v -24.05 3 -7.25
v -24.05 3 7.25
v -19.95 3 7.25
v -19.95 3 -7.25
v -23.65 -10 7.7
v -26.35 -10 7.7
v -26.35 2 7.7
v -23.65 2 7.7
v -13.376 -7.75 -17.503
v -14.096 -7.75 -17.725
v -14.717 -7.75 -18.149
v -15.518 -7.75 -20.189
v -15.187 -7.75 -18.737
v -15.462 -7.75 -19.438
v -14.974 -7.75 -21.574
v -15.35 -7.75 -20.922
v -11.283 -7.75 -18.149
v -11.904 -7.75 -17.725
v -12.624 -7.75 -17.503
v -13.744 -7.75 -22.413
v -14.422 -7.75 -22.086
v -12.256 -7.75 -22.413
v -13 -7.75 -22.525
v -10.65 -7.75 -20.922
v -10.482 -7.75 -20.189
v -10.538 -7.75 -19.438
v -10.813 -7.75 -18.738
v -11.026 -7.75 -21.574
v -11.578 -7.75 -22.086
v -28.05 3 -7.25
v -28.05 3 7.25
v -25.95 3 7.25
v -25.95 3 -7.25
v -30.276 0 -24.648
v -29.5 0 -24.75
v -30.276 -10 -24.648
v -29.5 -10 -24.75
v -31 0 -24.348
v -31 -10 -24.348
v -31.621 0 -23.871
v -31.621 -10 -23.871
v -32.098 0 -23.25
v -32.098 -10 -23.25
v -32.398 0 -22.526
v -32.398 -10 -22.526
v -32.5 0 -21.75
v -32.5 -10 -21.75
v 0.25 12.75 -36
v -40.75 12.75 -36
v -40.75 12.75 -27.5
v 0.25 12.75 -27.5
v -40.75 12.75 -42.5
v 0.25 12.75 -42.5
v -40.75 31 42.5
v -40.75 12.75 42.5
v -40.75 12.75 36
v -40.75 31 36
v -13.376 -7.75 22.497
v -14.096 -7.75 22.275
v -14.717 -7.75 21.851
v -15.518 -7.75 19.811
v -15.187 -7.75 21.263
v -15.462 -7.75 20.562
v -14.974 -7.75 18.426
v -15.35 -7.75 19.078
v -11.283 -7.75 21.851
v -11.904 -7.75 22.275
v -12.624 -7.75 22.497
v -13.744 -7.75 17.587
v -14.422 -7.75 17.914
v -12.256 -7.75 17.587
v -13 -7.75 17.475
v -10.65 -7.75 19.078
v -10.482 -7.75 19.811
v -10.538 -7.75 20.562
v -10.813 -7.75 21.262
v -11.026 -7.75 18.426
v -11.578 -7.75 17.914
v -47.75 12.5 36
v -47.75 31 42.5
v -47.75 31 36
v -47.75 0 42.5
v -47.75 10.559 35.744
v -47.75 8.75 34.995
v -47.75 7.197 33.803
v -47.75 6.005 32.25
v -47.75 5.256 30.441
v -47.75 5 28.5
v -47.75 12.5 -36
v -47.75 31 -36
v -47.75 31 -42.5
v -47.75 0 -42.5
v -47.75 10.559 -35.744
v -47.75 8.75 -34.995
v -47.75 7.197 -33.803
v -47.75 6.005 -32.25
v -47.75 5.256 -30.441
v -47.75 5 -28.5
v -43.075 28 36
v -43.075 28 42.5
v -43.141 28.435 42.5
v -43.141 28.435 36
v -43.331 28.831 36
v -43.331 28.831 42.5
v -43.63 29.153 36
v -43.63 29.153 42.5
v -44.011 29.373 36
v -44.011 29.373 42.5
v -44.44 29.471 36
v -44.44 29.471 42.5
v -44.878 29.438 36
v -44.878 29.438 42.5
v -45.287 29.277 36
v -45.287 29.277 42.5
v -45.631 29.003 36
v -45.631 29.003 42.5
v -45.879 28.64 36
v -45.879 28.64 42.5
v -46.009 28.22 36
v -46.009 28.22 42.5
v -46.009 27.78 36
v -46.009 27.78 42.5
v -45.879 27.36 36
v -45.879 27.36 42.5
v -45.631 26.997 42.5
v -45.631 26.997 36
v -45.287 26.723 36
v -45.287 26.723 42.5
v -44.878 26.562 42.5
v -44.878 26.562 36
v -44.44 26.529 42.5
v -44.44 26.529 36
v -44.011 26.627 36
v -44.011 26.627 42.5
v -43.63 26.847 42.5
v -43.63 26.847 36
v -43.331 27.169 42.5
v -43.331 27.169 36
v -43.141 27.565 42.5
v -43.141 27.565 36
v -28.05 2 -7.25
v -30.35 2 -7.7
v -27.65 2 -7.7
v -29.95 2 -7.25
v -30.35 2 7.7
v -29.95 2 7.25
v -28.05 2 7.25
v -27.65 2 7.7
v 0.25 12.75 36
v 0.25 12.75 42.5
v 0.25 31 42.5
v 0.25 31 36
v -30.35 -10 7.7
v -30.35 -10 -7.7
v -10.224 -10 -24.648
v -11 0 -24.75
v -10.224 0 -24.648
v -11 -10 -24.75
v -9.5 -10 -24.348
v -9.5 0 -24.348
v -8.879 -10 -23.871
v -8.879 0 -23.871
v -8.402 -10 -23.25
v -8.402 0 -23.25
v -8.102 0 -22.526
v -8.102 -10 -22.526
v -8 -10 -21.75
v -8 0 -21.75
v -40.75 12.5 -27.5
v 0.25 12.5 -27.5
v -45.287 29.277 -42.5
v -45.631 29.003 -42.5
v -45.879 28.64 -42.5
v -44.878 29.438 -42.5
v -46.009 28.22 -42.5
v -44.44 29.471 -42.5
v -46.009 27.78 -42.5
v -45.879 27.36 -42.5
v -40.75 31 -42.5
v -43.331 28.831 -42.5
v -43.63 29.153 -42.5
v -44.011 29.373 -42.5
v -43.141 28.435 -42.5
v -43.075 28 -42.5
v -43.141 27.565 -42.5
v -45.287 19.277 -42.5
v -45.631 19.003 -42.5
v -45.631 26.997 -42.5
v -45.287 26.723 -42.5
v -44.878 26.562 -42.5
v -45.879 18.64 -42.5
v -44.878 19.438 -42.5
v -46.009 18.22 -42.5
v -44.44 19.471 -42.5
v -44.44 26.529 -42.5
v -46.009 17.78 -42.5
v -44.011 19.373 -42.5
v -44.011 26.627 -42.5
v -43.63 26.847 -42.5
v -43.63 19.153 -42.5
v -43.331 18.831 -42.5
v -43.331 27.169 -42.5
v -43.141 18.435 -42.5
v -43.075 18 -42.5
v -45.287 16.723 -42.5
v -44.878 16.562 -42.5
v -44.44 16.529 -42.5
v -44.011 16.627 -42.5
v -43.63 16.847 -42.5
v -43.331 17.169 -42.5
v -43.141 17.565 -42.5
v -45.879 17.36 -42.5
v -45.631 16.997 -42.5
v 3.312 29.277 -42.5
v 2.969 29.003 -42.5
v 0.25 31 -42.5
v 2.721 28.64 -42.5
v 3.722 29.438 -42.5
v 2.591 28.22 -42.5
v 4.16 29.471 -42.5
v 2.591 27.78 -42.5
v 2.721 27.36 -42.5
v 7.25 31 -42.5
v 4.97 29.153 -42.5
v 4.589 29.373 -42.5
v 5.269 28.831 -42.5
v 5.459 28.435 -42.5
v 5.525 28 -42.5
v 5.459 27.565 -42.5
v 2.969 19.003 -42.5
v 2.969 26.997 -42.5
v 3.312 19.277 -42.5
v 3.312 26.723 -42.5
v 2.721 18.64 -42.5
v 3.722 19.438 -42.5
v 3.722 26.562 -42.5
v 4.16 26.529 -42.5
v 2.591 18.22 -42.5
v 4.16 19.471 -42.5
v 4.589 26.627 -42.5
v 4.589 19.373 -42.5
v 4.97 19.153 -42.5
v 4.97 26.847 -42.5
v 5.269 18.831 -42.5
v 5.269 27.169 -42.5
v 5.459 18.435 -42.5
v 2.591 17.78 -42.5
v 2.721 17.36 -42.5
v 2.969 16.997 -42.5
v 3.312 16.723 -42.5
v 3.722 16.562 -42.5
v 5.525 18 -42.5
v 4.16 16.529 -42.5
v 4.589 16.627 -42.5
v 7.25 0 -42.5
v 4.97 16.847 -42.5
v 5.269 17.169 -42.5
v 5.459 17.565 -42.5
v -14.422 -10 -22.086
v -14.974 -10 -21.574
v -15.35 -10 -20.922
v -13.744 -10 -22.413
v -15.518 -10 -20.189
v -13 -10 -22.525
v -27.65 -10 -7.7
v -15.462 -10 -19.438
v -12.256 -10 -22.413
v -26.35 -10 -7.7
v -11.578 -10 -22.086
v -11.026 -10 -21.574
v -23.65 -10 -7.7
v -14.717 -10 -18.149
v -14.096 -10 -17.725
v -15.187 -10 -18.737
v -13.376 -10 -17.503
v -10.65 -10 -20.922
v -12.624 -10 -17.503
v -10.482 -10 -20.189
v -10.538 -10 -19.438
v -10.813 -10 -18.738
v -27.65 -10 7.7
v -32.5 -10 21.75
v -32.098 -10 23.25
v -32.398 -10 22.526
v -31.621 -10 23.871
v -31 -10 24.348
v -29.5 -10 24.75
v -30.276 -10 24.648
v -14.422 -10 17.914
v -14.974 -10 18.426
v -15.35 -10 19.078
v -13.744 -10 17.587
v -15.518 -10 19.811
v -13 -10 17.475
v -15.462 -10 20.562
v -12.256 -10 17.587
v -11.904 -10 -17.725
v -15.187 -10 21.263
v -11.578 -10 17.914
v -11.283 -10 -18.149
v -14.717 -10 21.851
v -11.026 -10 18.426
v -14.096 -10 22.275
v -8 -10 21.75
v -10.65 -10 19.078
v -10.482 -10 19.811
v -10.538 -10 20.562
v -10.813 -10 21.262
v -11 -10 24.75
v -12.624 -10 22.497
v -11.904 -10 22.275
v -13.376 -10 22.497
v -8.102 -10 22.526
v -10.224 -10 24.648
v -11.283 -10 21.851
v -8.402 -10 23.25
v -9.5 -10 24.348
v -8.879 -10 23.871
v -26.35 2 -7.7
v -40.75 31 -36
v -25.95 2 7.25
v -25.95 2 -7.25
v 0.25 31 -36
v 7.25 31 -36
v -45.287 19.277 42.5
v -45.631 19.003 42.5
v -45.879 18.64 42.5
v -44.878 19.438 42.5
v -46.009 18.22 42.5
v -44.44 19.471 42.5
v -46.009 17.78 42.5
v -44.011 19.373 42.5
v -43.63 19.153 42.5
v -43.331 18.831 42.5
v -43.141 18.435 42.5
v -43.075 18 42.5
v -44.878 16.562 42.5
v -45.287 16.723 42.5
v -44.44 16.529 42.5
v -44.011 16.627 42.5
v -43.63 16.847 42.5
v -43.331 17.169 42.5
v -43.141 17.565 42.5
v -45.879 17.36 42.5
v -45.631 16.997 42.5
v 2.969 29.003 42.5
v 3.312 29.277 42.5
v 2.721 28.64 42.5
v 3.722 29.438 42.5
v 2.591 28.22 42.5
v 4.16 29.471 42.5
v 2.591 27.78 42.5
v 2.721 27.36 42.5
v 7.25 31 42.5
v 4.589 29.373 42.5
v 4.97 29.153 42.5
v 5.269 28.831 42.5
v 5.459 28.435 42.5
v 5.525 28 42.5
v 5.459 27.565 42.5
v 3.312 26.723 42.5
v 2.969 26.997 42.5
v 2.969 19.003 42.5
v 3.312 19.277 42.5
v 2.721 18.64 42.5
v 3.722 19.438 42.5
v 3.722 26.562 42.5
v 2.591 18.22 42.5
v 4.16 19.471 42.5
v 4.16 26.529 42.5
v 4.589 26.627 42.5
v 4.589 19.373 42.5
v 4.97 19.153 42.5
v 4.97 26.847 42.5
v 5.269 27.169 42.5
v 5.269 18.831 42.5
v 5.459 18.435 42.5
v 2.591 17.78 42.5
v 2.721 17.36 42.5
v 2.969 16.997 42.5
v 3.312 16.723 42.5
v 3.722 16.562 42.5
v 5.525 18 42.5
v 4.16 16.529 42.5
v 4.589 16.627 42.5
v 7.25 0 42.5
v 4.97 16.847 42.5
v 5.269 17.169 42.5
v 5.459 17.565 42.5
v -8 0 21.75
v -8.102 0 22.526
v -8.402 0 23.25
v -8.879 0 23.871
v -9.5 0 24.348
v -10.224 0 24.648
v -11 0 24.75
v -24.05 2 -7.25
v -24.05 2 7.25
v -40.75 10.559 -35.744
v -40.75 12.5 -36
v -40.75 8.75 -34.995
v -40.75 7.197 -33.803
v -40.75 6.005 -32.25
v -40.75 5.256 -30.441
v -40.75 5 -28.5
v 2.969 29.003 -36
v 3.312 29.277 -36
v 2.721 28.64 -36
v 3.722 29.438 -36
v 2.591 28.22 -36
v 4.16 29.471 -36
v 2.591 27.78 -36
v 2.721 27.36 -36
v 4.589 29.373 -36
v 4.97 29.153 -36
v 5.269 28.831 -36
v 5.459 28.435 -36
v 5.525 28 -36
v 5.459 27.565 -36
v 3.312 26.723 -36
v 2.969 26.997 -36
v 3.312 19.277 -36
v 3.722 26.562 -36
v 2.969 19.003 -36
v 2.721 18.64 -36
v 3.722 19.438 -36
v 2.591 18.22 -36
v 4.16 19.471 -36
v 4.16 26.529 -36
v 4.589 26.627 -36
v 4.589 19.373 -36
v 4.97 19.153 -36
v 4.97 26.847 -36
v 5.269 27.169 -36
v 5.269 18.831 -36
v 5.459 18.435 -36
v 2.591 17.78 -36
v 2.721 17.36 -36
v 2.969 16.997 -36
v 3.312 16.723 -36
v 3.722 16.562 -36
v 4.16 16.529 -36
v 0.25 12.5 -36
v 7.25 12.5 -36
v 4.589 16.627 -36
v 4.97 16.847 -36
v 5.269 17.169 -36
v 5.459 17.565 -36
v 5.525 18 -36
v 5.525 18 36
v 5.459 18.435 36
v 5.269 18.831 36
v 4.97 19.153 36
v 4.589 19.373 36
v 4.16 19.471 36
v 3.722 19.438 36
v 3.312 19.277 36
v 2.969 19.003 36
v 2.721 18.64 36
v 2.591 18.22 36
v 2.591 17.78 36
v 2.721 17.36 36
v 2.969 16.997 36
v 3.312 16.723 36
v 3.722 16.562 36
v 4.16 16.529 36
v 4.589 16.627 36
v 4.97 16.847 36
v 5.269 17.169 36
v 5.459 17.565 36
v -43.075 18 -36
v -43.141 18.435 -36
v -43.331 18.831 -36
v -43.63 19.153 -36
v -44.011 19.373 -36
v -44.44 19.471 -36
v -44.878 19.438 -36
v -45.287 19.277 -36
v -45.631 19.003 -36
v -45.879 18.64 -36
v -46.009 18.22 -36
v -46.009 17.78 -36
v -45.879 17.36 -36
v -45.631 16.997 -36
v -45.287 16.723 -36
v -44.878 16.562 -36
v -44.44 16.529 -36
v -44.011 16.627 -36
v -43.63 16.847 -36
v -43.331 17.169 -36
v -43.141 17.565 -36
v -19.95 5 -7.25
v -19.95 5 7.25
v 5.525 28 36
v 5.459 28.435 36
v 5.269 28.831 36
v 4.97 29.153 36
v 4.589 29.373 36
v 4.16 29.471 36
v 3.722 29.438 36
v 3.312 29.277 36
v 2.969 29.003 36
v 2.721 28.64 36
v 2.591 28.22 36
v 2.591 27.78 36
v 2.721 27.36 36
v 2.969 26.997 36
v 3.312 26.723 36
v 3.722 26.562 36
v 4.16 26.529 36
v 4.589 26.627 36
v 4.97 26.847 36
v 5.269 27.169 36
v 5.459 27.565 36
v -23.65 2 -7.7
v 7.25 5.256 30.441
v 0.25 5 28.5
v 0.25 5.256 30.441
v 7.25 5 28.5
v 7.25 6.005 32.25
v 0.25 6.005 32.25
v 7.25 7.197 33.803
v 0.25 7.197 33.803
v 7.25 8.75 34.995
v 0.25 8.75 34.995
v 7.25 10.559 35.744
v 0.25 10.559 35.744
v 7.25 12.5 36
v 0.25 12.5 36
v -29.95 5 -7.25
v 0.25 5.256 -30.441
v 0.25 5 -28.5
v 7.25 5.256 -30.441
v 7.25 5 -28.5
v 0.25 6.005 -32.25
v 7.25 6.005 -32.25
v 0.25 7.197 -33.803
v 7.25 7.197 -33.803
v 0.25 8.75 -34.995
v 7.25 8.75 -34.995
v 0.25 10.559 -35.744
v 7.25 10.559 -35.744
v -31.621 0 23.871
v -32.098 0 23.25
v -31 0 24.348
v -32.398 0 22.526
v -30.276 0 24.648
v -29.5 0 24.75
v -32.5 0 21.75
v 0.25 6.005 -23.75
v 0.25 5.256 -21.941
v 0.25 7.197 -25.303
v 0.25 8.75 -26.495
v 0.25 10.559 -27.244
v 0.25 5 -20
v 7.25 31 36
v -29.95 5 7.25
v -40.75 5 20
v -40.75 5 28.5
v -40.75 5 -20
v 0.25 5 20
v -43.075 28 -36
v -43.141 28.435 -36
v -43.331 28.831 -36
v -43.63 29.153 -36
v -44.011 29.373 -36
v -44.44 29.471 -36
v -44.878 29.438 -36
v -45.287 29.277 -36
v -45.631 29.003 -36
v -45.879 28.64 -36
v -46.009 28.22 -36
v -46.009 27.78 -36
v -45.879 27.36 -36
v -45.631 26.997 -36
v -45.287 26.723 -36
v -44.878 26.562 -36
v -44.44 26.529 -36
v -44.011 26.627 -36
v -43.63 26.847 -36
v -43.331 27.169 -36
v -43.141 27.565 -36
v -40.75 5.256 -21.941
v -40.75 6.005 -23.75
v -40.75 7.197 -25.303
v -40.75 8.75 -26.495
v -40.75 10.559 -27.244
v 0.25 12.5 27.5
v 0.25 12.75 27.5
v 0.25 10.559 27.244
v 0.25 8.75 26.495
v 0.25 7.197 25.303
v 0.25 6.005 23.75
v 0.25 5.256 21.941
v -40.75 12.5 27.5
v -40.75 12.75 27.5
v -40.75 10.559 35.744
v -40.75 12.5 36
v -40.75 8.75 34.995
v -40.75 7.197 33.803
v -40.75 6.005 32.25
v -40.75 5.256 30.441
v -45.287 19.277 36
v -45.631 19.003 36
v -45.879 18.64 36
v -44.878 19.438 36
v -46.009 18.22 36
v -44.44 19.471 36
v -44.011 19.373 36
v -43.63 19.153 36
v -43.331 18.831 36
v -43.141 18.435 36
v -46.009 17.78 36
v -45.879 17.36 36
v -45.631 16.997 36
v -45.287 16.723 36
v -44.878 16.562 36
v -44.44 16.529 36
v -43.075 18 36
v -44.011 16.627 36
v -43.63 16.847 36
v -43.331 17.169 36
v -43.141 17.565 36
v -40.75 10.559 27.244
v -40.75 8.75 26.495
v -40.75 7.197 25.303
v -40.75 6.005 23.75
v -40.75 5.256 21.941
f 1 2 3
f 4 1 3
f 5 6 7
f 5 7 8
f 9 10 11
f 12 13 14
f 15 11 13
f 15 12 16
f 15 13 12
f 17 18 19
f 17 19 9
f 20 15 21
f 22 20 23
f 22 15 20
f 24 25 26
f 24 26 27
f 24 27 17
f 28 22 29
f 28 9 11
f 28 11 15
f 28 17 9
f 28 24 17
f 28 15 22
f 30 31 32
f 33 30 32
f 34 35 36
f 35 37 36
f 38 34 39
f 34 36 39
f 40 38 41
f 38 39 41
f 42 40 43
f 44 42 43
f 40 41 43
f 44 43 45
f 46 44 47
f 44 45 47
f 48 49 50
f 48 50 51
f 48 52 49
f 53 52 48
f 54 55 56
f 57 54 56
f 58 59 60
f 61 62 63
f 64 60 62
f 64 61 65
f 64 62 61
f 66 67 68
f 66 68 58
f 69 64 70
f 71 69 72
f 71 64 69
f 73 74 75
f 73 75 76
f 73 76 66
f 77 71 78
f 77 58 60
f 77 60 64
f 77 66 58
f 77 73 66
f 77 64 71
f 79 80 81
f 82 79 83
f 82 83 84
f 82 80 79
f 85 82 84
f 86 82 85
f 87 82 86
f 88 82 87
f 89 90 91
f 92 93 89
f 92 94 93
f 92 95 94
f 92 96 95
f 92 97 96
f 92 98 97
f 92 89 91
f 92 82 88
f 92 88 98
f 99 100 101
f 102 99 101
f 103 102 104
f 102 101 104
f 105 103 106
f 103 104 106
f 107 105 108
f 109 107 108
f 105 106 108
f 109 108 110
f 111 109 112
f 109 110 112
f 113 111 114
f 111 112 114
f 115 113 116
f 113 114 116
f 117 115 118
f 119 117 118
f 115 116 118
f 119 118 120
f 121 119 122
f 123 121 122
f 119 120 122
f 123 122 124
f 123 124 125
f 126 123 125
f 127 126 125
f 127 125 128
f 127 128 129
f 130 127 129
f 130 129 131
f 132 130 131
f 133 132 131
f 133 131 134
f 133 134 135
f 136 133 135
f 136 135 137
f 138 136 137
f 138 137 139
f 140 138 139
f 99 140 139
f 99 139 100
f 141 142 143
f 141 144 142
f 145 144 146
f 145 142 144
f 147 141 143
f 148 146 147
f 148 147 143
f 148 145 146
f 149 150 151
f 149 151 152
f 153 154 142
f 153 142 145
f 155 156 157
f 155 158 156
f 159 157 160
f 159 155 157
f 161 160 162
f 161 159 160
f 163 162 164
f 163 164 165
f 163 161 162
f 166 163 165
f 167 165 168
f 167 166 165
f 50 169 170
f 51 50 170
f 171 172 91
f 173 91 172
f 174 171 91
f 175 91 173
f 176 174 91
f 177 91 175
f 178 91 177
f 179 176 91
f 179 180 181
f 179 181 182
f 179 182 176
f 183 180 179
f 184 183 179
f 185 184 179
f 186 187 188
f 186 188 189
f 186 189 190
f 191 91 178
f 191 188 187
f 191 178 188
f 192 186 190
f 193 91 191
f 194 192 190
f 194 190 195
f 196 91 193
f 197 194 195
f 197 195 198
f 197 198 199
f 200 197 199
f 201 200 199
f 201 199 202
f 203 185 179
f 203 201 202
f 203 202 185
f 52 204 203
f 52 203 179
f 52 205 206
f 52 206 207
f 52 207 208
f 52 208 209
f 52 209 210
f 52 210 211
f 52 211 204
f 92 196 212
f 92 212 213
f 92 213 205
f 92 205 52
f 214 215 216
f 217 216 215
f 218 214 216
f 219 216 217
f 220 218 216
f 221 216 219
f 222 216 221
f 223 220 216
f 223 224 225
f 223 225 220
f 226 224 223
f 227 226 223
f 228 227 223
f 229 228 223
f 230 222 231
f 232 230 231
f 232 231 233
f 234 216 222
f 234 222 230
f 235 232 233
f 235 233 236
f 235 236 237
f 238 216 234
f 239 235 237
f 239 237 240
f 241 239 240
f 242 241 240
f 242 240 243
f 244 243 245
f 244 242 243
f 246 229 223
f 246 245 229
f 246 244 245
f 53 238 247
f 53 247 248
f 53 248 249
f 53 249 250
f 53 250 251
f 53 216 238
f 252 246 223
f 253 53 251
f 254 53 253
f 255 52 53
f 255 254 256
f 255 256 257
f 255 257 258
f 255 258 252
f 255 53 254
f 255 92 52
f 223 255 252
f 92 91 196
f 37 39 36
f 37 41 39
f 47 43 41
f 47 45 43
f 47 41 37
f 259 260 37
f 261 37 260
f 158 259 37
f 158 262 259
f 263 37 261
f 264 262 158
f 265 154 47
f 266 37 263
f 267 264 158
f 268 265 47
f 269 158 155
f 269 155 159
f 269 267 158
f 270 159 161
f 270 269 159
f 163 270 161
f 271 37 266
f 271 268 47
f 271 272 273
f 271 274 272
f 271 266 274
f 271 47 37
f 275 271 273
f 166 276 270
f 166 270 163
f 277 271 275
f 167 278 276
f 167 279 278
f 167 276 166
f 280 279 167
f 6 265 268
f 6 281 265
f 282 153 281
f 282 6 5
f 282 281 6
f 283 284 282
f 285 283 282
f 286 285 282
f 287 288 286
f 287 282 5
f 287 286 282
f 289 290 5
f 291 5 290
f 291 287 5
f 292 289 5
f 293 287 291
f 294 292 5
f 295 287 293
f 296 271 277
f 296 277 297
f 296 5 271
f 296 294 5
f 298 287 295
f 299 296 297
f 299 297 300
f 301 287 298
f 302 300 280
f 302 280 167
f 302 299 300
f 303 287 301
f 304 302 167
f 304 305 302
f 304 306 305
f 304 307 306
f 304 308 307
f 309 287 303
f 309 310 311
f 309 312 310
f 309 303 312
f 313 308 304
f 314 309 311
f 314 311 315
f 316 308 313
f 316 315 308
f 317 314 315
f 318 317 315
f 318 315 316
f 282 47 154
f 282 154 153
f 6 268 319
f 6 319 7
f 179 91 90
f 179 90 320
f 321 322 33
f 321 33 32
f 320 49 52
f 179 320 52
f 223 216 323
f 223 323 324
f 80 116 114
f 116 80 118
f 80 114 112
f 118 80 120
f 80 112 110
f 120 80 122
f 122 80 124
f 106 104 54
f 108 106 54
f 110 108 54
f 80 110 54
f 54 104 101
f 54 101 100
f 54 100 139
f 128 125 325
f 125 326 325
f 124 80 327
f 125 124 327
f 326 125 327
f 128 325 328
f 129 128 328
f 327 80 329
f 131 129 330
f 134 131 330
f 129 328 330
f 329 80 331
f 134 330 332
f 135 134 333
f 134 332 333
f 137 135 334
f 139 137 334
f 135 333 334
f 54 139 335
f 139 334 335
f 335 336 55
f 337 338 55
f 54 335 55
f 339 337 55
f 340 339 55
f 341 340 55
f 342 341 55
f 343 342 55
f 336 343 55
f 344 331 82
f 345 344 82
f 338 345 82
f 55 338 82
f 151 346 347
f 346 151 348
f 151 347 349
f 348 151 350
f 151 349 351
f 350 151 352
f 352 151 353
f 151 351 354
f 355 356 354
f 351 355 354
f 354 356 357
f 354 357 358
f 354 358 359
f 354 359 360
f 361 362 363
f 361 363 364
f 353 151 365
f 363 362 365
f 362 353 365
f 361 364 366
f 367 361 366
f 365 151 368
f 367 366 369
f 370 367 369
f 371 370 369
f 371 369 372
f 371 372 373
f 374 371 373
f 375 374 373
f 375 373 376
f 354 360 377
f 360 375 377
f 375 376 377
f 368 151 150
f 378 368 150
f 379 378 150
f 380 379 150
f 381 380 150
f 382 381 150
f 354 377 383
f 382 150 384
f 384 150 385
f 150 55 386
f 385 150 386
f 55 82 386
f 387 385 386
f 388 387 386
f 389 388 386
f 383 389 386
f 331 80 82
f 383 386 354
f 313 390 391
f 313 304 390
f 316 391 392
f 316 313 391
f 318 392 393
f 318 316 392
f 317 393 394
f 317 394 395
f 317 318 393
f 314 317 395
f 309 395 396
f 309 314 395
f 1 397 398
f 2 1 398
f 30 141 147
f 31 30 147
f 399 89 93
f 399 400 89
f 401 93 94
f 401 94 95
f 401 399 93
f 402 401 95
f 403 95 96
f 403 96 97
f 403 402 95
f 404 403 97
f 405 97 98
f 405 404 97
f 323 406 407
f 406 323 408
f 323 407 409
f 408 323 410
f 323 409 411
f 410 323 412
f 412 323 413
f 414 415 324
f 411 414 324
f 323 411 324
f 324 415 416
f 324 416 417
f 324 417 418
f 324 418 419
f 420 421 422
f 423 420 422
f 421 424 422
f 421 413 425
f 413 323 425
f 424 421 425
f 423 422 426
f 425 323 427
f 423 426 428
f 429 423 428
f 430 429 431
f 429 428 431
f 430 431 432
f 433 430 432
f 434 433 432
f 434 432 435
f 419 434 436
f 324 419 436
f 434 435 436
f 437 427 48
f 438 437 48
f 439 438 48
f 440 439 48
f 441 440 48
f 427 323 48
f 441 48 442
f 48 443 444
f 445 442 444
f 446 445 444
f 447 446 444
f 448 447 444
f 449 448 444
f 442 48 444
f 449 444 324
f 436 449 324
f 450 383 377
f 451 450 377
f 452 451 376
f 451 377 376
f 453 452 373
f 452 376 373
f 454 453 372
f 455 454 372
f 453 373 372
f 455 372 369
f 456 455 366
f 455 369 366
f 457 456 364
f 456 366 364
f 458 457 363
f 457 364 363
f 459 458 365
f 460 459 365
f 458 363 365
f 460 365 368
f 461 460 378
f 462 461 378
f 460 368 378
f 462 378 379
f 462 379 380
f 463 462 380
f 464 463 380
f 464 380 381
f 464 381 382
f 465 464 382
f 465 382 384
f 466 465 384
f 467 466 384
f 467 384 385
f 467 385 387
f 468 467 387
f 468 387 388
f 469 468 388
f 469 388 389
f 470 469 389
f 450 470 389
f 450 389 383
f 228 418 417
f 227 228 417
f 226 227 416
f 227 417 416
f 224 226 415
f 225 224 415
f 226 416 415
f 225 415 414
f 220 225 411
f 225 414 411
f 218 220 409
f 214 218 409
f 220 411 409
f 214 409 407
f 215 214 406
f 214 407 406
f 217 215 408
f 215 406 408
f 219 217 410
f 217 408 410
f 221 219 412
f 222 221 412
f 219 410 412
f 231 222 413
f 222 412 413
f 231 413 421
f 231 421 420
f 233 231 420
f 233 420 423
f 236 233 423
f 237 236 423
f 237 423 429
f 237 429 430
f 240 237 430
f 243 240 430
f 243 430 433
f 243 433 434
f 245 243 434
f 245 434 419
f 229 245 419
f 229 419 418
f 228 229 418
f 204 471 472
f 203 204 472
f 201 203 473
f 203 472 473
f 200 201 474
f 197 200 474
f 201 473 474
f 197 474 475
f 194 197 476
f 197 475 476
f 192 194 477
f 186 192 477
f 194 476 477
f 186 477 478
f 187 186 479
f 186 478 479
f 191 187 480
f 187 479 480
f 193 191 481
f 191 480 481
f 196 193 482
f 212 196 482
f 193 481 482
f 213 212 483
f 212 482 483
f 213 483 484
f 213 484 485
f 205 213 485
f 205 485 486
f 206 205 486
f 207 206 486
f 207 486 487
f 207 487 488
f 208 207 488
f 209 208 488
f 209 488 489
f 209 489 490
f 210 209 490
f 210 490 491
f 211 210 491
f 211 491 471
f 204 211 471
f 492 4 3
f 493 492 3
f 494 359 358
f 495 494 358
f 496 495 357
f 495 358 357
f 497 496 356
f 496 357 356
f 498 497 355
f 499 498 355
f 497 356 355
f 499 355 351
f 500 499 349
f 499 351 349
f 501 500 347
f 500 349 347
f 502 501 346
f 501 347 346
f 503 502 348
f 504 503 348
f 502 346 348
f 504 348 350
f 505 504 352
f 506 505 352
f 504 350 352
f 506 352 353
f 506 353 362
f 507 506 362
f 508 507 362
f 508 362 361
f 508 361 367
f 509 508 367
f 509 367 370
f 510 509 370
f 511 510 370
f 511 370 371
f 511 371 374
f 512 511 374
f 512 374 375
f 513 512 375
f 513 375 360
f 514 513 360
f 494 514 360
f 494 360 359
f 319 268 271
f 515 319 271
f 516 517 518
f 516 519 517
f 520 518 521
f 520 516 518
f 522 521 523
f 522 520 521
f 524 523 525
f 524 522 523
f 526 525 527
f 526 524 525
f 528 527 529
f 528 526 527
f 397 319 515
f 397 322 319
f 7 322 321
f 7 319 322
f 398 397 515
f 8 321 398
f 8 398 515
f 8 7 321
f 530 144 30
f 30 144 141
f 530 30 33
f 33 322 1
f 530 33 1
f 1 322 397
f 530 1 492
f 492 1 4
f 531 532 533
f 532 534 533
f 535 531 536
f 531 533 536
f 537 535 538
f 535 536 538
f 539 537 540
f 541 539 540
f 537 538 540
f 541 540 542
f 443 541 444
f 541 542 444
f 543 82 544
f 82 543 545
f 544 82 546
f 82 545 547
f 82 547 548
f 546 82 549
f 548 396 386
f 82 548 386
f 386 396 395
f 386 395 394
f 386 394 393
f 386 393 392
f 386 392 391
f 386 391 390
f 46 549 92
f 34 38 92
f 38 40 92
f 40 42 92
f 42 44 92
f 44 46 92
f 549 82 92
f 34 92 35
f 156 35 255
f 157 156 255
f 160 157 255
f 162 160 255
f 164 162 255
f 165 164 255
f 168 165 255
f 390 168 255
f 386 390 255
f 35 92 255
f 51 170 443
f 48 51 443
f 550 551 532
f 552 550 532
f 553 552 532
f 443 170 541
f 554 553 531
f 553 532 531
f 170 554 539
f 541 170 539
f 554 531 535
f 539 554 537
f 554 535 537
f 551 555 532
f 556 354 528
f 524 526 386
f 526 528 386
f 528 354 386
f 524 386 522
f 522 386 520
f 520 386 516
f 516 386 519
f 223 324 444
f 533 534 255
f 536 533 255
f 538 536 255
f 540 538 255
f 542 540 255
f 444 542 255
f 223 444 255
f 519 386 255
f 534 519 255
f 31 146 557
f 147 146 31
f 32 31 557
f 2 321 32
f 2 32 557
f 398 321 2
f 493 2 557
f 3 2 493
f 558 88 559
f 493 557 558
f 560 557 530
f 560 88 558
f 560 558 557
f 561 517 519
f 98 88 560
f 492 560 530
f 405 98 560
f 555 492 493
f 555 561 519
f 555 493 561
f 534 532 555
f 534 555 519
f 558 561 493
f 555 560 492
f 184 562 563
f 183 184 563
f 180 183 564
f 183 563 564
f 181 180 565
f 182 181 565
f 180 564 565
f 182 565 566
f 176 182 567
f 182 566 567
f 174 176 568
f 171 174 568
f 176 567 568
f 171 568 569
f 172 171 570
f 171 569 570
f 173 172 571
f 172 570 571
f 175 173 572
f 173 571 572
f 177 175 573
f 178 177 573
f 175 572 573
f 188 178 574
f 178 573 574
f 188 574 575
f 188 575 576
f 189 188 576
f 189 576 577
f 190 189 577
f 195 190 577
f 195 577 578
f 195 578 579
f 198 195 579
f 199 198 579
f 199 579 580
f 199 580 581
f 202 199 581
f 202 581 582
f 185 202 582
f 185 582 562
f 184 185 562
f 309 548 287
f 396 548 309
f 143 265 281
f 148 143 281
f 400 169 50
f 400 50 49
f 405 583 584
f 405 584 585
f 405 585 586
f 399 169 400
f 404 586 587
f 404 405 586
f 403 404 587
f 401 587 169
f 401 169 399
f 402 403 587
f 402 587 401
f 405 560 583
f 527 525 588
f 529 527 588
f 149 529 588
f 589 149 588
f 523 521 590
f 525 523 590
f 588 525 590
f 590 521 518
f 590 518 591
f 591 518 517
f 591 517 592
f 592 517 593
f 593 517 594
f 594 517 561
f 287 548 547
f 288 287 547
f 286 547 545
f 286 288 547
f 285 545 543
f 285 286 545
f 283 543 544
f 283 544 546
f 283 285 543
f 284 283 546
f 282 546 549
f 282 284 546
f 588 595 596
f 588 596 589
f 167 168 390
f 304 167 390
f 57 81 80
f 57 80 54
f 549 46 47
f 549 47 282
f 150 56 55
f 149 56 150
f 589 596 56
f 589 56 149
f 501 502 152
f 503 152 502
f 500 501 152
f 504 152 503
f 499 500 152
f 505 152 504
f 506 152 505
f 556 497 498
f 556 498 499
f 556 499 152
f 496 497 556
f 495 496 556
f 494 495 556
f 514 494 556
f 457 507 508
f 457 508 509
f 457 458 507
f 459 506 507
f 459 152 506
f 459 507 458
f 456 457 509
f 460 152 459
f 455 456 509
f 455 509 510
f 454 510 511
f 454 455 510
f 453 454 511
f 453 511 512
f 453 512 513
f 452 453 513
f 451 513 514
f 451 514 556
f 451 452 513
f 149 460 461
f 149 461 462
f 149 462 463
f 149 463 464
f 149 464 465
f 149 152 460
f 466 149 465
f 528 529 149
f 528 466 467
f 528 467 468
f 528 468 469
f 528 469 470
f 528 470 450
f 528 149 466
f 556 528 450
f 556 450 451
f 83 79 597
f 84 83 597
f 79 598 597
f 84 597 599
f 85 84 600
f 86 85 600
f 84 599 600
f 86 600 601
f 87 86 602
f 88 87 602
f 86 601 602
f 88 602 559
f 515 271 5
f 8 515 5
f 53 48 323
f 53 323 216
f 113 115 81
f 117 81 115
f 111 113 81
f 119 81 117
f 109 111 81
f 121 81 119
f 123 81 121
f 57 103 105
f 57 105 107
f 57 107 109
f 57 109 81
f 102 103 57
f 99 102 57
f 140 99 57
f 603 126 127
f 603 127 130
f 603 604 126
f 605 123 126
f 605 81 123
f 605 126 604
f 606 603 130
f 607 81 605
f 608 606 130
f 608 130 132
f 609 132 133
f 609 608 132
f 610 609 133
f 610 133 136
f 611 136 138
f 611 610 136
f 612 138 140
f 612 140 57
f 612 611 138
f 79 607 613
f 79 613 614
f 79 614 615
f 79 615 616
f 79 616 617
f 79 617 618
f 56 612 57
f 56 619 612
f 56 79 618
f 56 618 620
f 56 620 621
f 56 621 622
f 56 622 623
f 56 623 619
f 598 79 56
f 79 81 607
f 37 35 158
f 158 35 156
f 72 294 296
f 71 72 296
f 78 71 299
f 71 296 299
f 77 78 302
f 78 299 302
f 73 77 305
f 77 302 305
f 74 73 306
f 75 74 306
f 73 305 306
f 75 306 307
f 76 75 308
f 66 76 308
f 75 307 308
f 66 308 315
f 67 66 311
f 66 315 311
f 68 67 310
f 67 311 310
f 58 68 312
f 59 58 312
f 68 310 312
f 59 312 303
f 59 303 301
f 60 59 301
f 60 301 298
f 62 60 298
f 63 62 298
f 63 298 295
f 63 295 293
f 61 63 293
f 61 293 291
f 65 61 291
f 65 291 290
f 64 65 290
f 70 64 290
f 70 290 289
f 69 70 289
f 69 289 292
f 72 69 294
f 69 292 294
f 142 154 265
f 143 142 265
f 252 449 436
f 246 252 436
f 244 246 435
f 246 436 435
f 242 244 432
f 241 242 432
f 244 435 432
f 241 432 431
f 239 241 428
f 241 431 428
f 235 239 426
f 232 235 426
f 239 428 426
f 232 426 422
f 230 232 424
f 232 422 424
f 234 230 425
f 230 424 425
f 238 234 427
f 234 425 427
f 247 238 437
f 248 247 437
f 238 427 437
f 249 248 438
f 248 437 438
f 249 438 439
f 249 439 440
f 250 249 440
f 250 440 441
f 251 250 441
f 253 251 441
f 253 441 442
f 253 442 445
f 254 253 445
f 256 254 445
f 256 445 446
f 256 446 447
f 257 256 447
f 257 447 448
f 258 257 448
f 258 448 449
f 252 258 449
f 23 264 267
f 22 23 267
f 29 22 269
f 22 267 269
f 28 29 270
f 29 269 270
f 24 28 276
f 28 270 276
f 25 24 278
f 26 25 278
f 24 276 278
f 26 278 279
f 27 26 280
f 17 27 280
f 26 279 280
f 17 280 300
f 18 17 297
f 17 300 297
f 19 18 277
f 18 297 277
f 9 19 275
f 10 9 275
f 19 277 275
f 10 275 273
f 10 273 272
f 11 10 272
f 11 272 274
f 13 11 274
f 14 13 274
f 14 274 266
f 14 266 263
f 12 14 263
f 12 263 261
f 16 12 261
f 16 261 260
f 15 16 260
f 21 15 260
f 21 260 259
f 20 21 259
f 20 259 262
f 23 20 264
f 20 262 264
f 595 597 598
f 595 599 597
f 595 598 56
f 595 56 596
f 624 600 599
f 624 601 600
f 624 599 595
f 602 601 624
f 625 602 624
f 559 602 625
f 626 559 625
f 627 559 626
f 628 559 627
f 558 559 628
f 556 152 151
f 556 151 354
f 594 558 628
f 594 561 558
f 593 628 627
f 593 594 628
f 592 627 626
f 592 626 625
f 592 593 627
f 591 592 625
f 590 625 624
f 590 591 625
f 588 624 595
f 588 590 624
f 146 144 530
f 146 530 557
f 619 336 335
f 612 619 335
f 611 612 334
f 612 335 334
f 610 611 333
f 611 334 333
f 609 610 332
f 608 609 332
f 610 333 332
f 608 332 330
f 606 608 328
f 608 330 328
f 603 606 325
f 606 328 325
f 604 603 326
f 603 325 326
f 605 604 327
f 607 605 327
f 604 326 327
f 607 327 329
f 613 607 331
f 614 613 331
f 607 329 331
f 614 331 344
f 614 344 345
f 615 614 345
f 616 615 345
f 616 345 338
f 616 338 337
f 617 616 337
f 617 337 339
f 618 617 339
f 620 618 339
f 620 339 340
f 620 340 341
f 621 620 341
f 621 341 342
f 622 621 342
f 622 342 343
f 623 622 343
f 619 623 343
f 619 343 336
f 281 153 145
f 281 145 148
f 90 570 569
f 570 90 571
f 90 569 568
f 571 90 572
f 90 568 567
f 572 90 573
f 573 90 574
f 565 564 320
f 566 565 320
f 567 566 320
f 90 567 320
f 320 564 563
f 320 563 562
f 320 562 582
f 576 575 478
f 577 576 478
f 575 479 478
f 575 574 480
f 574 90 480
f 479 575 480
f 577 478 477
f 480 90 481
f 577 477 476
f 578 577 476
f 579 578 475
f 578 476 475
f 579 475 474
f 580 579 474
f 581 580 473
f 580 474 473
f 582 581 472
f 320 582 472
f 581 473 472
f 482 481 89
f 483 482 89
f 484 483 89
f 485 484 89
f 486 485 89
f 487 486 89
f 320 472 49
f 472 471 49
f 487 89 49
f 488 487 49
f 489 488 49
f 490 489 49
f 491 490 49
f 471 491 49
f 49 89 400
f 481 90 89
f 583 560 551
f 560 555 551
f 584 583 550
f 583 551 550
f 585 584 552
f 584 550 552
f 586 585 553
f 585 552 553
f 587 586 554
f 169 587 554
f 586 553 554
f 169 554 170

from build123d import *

# Parameters (mm, degrees)
SKETCH_1_W          = 55
SKETCH_1_H          = 85
EXTRUDE_1_DEPTH     = 5
SKETCH_2_W          = 7
SKETCH_2_H          = 6.5
EXTRUDE_2_DEPTH     = 26
SKETCH_3_R          = 1.475
CUT_EXTRUDE_1_DEPTH = 103.30377559
SKETCH_4_W          = 41
SKETCH_4_H          = 15
EXTRUDE_3_DEPTH     = 7.75
SKETCH_5_W          = 24.5
SKETCH_5_H          = 49.5
EXTRUDE_4_DEPTH     = 10
SKETCH_7_R          = 2.525
CUT_EXTRUDE_2_DEPTH = 2.25
SKETCH_8_W          = 2.7
SKETCH_8_H          = 15.4
CUT_EXTRUDE_3_DEPTH = 12
SKETCH_9_W          = 1.9
SKETCH_9_H          = 14.5
CUT_EXTRUDE_4_DEPTH = 1
SKETCH_10_W         = 10
SKETCH_10_H         = 14.5
CUT_EXTRUDE_5_DEPTH = 70.787624261
FILLET_1_R          = 3
FILLET_2_R          = 7.5


with BuildPart() as part:
    # Эскиз1 → Бобышка-Вытянуть1 (new body)
    with BuildSketch(Plane(origin=(0, 0, 0), x_dir=(1, 0, 0), z_dir=(0, 1, 0))):
        with Locations((-20.25, 0)):
            Rectangle(SKETCH_1_W, SKETCH_1_H)
    extrude(amount=EXTRUDE_1_DEPTH)

    # Эскиз2 → Бобышка-Вытянуть2 (add)
    with BuildSketch(Plane(origin=(0, 5, 0), x_dir=(1, 0, 0), z_dir=(0, 1, 0))):
        with Locations((-44.25, 39.25)):
            Rectangle(SKETCH_2_W, SKETCH_2_H)
        with Locations((3.75, 39.25)):
            Rectangle(SKETCH_2_W, SKETCH_2_H)
        with Locations((3.75, -39.25)):
            Rectangle(SKETCH_2_W, SKETCH_2_H)
        with Locations((-44.25, -39.25)):
            Rectangle(SKETCH_2_W, SKETCH_2_H)
    extrude(amount=EXTRUDE_2_DEPTH)

    # Эскиз3 → Вырез-Вытянуть1 (cut, through all)
    with BuildSketch(Plane.XY.offset(42.5)):
        with Locations((-44.55, 28)):
            Circle(SKETCH_3_R)
        with Locations((-44.55, 18)):
            Circle(SKETCH_3_R)
        with Locations((4.05, 18)):
            Circle(SKETCH_3_R)
        with Locations((4.05, 28)):
            Circle(SKETCH_3_R)
    extrude(amount=-CUT_EXTRUDE_1_DEPTH, mode=Mode.SUBTRACT)

    # Эскиз4 → Бобышка-Вытянуть3 (add)
    with BuildSketch(Plane(origin=(0, 5, 0), x_dir=(1, 0, 0), z_dir=(0, 1, 0))):
        with Locations((-20.25, 35)):
            Rectangle(SKETCH_4_W, SKETCH_4_H)
        with Locations((-20.25, -35)):
            Rectangle(SKETCH_4_W, SKETCH_4_H)
    extrude(amount=EXTRUDE_3_DEPTH)

    # Эскиз5 → Бобышка-Вытянуть4 (add)
    with BuildSketch(Plane.XZ):
        with Locations((-20.25, 0)):
            Rectangle(SKETCH_5_W, SKETCH_5_H)
    extrude(amount=EXTRUDE_4_DEPTH)

    # Эскиз7 → Вырез-Вытянуть2 (cut)
    with BuildSketch(Plane.XZ.offset(10)):
        with Locations(Location((-13, 20, 0), (0, 0, 270))):
            Circle(SKETCH_7_R)
        with Locations(Location((-13, -20, 0), (0, 0, 270))):
            Circle(SKETCH_7_R)
    extrude(amount=-CUT_EXTRUDE_2_DEPTH, mode=Mode.SUBTRACT)

    # Эскиз8 → Вырез-Вытянуть3 (cut)
    with BuildSketch(Plane.XZ.offset(10)):
        with Locations((-29, 0)):
            Rectangle(SKETCH_8_W, SKETCH_8_H)
        with Locations((-25, 0)):
            Rectangle(SKETCH_8_W, SKETCH_8_H)
    extrude(amount=-CUT_EXTRUDE_3_DEPTH, mode=Mode.SUBTRACT)

    # Эскиз9 → Вырез-Вытянуть4 (cut)
    with BuildSketch(Plane.XZ.offset(-2)):
        with Locations((-29, 0)):
            Rectangle(SKETCH_9_W, SKETCH_9_H)
        with Locations((-25, 0)):
            Rectangle(SKETCH_9_W, SKETCH_9_H)
    extrude(amount=-CUT_EXTRUDE_4_DEPTH, mode=Mode.SUBTRACT)

    # Эскиз10 → Вырез-Вытянуть5 (cut, through all)
    with BuildSketch(Plane.XZ.offset(-3)):
        with Locations((-24.95, 0)):
            Rectangle(SKETCH_10_W, SKETCH_10_H)
    extrude(amount=-CUT_EXTRUDE_5_DEPTH, mode=Mode.SUBTRACT)

    # Скругление1
    fillet_1_edges = [part.edges().sort_by_distance(p)[0] for p in [
        (-32.5, -5, 24.75),
        (-32.5, -5, -24.75),
        (-8, -5, -24.75),
        (-8, -5, 24.75),
    ]]
    fillet(fillet_1_edges, radius=FILLET_1_R)

    # Скругление2
    fillet_2_edges = [part.edges().sort_by_distance(p)[0] for p in [
        (-20.25, 5, -27.5),
        (-20.25, 5, 27.5),
        (-44.25, 5, 36),
        (3.75, 5, 36),
        (3.75, 5, -36),
        (-44.25, 5, -36),
    ]]
    fillet(fillet_2_edges, radius=FILLET_2_R)


solid = part.part
